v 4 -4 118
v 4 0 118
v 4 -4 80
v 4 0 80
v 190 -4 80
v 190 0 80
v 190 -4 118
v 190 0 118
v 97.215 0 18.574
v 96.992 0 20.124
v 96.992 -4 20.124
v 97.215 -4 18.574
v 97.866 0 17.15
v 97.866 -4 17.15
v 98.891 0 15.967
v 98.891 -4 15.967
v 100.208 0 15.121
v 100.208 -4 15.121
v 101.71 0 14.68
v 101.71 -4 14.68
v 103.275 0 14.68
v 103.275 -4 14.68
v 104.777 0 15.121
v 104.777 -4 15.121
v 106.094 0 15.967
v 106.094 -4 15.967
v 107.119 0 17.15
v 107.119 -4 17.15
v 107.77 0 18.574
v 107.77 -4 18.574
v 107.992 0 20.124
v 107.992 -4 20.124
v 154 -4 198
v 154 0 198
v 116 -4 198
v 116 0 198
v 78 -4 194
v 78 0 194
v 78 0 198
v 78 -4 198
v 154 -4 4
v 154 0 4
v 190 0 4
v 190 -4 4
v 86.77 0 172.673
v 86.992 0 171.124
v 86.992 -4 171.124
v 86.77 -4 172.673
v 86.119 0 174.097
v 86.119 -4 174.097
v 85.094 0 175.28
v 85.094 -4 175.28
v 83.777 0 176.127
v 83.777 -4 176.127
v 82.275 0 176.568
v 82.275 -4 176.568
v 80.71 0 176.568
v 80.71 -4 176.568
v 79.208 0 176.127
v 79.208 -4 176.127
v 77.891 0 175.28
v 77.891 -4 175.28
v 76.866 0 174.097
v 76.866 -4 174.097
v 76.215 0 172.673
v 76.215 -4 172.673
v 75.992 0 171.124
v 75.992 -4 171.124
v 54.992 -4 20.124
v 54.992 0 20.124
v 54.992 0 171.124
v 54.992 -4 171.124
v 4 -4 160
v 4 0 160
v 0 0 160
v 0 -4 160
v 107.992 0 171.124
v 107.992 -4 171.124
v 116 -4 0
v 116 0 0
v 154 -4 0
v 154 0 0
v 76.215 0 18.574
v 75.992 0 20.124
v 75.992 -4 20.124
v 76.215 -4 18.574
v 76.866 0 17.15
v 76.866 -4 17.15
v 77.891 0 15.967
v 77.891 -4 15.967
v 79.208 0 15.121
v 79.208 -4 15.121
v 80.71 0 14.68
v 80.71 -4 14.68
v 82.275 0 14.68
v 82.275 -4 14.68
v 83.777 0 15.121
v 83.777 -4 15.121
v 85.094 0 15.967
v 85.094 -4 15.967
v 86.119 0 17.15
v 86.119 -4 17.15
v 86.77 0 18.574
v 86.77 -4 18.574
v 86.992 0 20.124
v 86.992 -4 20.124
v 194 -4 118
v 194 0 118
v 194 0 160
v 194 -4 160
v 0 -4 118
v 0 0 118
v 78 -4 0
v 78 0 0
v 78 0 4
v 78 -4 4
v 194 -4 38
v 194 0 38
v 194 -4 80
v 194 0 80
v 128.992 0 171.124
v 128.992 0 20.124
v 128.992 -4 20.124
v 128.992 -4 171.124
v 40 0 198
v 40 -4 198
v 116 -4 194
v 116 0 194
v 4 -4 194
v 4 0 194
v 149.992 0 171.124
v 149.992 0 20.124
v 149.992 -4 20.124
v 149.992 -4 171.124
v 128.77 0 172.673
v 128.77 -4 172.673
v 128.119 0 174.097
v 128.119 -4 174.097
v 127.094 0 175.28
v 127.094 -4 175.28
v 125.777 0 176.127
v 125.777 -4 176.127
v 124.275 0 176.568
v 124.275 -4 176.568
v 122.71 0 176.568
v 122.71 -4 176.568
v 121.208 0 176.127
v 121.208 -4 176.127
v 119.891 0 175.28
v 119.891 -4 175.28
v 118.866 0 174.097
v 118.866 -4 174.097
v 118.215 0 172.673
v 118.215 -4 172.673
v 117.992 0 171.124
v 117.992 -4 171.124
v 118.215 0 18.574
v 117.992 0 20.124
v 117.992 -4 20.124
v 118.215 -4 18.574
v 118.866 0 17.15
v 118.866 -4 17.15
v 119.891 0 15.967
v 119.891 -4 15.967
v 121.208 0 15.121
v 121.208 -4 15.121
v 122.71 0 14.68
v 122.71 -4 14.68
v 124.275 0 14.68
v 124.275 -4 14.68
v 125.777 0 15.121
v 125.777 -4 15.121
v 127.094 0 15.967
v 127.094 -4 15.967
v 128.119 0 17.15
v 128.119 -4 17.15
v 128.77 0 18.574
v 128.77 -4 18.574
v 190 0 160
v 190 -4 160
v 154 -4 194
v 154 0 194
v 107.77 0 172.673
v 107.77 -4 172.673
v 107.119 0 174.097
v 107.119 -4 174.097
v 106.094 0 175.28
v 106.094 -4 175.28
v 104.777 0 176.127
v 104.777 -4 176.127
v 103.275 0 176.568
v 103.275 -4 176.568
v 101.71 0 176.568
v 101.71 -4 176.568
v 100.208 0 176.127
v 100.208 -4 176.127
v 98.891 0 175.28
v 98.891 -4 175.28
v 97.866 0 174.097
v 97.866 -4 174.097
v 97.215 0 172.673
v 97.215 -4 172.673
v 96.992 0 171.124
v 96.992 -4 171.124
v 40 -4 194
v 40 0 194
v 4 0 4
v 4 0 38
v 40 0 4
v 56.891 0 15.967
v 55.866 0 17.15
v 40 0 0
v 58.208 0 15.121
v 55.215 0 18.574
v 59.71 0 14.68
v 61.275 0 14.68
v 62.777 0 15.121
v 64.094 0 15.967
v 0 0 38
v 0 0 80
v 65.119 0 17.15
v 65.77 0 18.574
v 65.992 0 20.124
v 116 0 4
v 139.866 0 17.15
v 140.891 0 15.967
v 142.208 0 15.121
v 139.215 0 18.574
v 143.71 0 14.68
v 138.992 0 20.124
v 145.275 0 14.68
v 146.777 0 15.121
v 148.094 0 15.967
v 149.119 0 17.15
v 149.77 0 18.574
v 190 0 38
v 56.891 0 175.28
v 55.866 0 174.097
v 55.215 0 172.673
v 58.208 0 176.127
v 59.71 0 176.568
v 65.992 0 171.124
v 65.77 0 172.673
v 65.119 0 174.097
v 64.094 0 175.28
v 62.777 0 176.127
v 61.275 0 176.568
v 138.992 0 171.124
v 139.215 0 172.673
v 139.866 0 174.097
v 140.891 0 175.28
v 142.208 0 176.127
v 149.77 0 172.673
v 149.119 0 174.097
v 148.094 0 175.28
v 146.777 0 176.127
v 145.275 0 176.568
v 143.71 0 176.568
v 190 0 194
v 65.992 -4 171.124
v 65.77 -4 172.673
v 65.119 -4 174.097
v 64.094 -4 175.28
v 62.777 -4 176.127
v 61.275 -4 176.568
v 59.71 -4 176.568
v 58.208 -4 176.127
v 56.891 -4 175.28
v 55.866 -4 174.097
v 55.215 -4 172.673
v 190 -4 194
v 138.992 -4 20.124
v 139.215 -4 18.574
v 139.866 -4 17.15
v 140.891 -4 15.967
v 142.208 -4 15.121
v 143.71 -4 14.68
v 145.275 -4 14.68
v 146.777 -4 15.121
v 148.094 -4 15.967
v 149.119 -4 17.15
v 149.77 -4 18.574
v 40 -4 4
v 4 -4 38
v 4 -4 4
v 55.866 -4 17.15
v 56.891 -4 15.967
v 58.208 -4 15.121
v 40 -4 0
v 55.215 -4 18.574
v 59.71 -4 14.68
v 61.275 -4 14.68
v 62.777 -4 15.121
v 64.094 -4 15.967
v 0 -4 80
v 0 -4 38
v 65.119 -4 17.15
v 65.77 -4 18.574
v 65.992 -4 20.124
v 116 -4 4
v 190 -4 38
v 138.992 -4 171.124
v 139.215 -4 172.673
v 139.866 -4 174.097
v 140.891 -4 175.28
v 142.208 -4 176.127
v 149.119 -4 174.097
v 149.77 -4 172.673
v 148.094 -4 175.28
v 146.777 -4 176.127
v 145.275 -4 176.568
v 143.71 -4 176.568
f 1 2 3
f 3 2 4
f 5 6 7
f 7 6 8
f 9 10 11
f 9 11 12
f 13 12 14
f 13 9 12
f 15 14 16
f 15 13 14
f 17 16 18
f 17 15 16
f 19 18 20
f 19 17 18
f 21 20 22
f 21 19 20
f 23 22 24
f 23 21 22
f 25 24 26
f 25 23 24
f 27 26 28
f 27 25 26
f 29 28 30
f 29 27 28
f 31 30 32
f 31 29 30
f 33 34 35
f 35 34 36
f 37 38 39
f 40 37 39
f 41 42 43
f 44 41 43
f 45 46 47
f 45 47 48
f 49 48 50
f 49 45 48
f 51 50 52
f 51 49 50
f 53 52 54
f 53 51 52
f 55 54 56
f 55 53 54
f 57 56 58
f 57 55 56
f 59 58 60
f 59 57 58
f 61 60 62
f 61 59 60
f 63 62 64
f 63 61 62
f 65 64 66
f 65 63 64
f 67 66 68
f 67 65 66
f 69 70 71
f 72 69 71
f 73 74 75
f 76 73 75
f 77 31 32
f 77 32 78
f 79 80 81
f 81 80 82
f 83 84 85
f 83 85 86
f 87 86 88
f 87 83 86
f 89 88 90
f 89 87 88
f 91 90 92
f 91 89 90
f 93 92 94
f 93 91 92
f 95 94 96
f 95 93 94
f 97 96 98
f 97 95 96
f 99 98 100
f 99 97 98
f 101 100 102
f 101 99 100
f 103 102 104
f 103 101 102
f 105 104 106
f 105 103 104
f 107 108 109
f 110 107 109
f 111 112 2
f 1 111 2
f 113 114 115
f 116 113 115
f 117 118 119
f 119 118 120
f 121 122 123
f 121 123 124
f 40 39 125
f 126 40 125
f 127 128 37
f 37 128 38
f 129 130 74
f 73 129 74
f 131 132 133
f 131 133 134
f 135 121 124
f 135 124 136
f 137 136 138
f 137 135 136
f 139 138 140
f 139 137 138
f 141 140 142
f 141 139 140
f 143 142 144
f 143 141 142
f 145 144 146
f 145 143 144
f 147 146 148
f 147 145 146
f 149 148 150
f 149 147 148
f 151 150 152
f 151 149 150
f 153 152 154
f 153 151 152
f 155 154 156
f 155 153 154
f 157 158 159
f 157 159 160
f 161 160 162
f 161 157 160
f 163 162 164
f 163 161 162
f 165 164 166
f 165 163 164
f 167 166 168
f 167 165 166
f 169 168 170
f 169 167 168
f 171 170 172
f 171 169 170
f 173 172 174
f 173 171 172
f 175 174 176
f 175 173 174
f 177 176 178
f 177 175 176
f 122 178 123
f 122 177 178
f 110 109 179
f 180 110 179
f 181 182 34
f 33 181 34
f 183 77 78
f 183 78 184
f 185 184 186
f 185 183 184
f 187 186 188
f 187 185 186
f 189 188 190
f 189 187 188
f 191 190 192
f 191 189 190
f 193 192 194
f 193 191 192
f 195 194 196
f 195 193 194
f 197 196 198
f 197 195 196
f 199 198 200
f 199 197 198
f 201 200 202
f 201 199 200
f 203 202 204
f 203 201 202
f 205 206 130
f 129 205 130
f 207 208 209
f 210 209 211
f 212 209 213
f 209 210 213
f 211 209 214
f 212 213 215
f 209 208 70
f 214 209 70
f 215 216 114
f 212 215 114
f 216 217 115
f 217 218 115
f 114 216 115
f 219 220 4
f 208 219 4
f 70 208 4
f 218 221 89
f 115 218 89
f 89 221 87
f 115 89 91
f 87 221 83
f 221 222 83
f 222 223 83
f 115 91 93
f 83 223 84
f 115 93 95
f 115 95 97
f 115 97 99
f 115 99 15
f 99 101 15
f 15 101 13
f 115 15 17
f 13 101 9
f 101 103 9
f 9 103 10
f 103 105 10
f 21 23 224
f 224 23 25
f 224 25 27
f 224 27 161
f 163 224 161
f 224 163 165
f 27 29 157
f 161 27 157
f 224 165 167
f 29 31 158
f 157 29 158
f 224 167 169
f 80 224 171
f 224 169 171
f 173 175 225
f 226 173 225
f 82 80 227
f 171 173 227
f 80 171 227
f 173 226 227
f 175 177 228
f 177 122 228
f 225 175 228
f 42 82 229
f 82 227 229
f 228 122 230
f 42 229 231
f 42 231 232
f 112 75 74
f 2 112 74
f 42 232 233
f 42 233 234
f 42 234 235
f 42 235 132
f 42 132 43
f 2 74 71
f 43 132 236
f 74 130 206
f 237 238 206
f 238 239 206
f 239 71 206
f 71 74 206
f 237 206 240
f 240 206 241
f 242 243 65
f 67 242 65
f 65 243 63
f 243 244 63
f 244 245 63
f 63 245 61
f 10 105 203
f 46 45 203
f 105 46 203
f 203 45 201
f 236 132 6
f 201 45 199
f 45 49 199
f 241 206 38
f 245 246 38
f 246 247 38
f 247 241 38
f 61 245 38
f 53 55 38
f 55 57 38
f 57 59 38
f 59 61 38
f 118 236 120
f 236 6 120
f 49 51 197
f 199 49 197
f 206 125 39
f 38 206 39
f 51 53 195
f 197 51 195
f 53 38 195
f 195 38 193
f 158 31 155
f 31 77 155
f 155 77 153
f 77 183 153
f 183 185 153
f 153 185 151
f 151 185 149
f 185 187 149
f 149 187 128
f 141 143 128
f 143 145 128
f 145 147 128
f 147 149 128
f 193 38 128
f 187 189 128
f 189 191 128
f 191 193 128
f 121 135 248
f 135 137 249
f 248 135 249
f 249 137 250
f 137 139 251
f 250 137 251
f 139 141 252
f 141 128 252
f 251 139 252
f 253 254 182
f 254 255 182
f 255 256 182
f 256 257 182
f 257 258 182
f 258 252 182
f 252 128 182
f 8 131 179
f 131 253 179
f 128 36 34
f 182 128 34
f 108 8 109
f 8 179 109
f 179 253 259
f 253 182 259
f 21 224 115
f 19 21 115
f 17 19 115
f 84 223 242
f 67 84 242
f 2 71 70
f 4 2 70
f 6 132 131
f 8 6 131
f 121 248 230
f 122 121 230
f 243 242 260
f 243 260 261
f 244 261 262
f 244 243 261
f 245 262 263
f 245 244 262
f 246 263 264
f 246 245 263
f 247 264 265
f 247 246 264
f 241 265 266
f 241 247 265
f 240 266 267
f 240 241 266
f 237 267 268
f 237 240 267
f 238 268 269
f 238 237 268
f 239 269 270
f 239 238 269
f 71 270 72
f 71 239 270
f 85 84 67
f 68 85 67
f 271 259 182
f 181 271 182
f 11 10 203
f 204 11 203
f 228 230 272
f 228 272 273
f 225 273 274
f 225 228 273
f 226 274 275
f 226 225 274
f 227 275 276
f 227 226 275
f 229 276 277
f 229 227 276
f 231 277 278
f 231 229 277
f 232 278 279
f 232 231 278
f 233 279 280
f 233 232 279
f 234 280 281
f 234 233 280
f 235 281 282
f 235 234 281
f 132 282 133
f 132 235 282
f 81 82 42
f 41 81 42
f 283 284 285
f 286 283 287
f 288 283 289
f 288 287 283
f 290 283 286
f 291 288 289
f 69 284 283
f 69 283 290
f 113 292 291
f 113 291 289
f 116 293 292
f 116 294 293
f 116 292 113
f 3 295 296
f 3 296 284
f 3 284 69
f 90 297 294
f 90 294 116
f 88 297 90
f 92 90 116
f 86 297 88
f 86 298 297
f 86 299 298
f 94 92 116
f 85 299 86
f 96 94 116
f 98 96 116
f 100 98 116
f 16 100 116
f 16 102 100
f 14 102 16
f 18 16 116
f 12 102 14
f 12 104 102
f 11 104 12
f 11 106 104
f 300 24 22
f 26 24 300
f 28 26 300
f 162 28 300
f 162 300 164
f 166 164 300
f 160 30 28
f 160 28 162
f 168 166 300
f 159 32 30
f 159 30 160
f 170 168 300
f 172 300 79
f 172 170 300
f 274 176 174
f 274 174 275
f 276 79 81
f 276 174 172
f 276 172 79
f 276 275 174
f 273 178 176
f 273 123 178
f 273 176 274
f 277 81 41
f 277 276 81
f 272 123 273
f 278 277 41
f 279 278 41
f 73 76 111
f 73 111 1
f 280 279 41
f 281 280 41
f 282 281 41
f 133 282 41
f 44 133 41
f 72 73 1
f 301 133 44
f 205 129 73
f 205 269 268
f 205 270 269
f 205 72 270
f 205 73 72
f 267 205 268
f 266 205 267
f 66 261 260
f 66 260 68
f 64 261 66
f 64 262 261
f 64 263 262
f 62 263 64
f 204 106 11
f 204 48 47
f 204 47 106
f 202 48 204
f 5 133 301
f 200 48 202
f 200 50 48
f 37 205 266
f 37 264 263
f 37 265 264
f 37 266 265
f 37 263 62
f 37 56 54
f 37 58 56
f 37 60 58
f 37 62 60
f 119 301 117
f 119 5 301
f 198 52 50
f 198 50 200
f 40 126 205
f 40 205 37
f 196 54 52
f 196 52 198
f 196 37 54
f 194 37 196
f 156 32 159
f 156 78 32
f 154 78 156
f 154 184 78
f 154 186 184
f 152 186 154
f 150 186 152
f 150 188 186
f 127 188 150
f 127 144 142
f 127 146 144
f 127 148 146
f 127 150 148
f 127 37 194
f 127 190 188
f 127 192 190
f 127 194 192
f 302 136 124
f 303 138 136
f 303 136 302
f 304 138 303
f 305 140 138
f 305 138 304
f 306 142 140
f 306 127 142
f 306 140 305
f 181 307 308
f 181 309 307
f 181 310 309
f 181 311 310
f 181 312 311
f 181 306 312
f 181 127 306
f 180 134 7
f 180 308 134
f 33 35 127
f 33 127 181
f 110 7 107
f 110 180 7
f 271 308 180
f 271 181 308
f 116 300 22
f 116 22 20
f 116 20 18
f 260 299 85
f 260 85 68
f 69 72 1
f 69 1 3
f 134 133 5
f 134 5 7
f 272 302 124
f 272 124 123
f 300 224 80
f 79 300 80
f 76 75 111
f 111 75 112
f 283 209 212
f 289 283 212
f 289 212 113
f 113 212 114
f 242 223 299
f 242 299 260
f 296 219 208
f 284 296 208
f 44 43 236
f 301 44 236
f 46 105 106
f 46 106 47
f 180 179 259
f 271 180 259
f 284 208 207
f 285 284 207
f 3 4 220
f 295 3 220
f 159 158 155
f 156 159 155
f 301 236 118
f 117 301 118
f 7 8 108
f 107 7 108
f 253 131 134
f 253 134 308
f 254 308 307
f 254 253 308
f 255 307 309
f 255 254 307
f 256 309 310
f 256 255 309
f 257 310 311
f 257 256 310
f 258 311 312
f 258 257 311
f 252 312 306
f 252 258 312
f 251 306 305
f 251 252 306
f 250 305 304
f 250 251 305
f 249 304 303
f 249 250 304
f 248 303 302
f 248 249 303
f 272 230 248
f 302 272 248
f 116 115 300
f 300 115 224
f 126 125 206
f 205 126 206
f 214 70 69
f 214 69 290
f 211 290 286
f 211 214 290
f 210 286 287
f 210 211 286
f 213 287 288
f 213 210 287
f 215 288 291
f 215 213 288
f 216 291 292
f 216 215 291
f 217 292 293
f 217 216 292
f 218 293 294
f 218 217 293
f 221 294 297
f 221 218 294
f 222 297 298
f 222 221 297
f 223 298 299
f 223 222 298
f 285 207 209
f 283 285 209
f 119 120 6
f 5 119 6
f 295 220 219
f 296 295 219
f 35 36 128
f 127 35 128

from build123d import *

# Parameters (mm, degrees)
F1_DEPTH = 4
F2_W     = 11
F2_H     = 151
F3_DEPTH = 4


with BuildPart() as f1:
    # F0 (on Front) → F1 (new body)
    with BuildSketch(Plane.XZ):
        Polygon((40, 4), (40, 0), (78, 0), (78, 4), (116, 4), (116, 0), (154, 0), (154, 4), (190, 4), (190, 38), (194, 38), (194, 80), (190, 80), (190, 118), (194, 118), (194, 160), (190, 160), (190, 194), (154, 194), (154, 198), (116, 198), (116, 194), (78, 194), (78, 198), (40, 198), (40, 194), (4, 194), (4, 160), (0, 160), (0, 118), (4, 118), (4, 80), (0, 80), (0, 38), (4, 38), (4, 4), align=None)
    extrude(amount=F1_DEPTH)

    # F2 (on Front) → F3 (cut)
    with BuildSketch(Plane.XZ):
        with BuildLine():
            ThreePointArc((65.992474, 171.123865), (60.492474, 176.623865), (54.992474, 171.123865))
            Line((54.992474, 171.123865), (65.992474, 171.123865))
        make_face()
        with Locations((60.492474, 95.623865)):
            Rectangle(F2_W, F2_H)
        with BuildLine():
            Line((65.992474, 20.123865), (54.992474, 20.123865))
            ThreePointArc((54.992474, 20.123865), (60.492474, 14.623865), (65.992474, 20.123865))
        make_face()
        with BuildLine():
            ThreePointArc((86.992474, 171.123865), (81.492474, 176.623865), (75.992474, 171.123865))
            Line((75.992474, 171.123865), (86.992474, 171.123865))
        make_face()
        with Locations((81.492474, 95.623865)):
            Rectangle(F2_W, F2_H)
        with BuildLine():
            Line((86.992474, 20.123865), (75.992474, 20.123865))
            ThreePointArc((75.992474, 20.123865), (81.492474, 14.623865), (86.992474, 20.123865))
        make_face()
        with BuildLine():
            ThreePointArc((107.992474, 171.123865), (102.492474, 176.623865), (96.992474, 171.123865))
            Line((96.992474, 171.123865), (107.992474, 171.123865))
        make_face()
        with Locations((102.492474, 95.623865)):
            Rectangle(F2_W, F2_H)
        with BuildLine():
            Line((107.992474, 20.123865), (96.992474, 20.123865))
            ThreePointArc((96.992474, 20.123865), (102.492474, 14.623865), (107.992474, 20.123865))
        make_face()
        with BuildLine():
            ThreePointArc((128.992474, 171.123865), (123.492474, 176.623865), (117.992474, 171.123865))
            Line((117.992474, 171.123865), (128.992474, 171.123865))
        make_face()
        with Locations((123.492474, 95.623865)):
            Rectangle(F2_W, F2_H)
        with BuildLine():
            Line((128.992474, 20.123865), (117.992474, 20.123865))
            ThreePointArc((117.992474, 20.123865), (123.492474, 14.623865), (128.992474, 20.123865))
        make_face()
        with BuildLine():
            ThreePointArc((149.992474, 171.123865), (144.492474, 176.623865), (138.992474, 171.123865))
            Line((138.992474, 171.123865), (149.992474, 171.123865))
        make_face()
        with Locations((144.492474, 95.623865)):
            Rectangle(F2_W, F2_H)
        with BuildLine():
            Line((149.992474, 20.123865), (138.992474, 20.123865))
            ThreePointArc((138.992474, 20.123865), (144.492474, 14.623865), (149.992474, 20.123865))
        make_face()
    extrude(amount=F3_DEPTH, mode=Mode.SUBTRACT)


solid = f1.part
